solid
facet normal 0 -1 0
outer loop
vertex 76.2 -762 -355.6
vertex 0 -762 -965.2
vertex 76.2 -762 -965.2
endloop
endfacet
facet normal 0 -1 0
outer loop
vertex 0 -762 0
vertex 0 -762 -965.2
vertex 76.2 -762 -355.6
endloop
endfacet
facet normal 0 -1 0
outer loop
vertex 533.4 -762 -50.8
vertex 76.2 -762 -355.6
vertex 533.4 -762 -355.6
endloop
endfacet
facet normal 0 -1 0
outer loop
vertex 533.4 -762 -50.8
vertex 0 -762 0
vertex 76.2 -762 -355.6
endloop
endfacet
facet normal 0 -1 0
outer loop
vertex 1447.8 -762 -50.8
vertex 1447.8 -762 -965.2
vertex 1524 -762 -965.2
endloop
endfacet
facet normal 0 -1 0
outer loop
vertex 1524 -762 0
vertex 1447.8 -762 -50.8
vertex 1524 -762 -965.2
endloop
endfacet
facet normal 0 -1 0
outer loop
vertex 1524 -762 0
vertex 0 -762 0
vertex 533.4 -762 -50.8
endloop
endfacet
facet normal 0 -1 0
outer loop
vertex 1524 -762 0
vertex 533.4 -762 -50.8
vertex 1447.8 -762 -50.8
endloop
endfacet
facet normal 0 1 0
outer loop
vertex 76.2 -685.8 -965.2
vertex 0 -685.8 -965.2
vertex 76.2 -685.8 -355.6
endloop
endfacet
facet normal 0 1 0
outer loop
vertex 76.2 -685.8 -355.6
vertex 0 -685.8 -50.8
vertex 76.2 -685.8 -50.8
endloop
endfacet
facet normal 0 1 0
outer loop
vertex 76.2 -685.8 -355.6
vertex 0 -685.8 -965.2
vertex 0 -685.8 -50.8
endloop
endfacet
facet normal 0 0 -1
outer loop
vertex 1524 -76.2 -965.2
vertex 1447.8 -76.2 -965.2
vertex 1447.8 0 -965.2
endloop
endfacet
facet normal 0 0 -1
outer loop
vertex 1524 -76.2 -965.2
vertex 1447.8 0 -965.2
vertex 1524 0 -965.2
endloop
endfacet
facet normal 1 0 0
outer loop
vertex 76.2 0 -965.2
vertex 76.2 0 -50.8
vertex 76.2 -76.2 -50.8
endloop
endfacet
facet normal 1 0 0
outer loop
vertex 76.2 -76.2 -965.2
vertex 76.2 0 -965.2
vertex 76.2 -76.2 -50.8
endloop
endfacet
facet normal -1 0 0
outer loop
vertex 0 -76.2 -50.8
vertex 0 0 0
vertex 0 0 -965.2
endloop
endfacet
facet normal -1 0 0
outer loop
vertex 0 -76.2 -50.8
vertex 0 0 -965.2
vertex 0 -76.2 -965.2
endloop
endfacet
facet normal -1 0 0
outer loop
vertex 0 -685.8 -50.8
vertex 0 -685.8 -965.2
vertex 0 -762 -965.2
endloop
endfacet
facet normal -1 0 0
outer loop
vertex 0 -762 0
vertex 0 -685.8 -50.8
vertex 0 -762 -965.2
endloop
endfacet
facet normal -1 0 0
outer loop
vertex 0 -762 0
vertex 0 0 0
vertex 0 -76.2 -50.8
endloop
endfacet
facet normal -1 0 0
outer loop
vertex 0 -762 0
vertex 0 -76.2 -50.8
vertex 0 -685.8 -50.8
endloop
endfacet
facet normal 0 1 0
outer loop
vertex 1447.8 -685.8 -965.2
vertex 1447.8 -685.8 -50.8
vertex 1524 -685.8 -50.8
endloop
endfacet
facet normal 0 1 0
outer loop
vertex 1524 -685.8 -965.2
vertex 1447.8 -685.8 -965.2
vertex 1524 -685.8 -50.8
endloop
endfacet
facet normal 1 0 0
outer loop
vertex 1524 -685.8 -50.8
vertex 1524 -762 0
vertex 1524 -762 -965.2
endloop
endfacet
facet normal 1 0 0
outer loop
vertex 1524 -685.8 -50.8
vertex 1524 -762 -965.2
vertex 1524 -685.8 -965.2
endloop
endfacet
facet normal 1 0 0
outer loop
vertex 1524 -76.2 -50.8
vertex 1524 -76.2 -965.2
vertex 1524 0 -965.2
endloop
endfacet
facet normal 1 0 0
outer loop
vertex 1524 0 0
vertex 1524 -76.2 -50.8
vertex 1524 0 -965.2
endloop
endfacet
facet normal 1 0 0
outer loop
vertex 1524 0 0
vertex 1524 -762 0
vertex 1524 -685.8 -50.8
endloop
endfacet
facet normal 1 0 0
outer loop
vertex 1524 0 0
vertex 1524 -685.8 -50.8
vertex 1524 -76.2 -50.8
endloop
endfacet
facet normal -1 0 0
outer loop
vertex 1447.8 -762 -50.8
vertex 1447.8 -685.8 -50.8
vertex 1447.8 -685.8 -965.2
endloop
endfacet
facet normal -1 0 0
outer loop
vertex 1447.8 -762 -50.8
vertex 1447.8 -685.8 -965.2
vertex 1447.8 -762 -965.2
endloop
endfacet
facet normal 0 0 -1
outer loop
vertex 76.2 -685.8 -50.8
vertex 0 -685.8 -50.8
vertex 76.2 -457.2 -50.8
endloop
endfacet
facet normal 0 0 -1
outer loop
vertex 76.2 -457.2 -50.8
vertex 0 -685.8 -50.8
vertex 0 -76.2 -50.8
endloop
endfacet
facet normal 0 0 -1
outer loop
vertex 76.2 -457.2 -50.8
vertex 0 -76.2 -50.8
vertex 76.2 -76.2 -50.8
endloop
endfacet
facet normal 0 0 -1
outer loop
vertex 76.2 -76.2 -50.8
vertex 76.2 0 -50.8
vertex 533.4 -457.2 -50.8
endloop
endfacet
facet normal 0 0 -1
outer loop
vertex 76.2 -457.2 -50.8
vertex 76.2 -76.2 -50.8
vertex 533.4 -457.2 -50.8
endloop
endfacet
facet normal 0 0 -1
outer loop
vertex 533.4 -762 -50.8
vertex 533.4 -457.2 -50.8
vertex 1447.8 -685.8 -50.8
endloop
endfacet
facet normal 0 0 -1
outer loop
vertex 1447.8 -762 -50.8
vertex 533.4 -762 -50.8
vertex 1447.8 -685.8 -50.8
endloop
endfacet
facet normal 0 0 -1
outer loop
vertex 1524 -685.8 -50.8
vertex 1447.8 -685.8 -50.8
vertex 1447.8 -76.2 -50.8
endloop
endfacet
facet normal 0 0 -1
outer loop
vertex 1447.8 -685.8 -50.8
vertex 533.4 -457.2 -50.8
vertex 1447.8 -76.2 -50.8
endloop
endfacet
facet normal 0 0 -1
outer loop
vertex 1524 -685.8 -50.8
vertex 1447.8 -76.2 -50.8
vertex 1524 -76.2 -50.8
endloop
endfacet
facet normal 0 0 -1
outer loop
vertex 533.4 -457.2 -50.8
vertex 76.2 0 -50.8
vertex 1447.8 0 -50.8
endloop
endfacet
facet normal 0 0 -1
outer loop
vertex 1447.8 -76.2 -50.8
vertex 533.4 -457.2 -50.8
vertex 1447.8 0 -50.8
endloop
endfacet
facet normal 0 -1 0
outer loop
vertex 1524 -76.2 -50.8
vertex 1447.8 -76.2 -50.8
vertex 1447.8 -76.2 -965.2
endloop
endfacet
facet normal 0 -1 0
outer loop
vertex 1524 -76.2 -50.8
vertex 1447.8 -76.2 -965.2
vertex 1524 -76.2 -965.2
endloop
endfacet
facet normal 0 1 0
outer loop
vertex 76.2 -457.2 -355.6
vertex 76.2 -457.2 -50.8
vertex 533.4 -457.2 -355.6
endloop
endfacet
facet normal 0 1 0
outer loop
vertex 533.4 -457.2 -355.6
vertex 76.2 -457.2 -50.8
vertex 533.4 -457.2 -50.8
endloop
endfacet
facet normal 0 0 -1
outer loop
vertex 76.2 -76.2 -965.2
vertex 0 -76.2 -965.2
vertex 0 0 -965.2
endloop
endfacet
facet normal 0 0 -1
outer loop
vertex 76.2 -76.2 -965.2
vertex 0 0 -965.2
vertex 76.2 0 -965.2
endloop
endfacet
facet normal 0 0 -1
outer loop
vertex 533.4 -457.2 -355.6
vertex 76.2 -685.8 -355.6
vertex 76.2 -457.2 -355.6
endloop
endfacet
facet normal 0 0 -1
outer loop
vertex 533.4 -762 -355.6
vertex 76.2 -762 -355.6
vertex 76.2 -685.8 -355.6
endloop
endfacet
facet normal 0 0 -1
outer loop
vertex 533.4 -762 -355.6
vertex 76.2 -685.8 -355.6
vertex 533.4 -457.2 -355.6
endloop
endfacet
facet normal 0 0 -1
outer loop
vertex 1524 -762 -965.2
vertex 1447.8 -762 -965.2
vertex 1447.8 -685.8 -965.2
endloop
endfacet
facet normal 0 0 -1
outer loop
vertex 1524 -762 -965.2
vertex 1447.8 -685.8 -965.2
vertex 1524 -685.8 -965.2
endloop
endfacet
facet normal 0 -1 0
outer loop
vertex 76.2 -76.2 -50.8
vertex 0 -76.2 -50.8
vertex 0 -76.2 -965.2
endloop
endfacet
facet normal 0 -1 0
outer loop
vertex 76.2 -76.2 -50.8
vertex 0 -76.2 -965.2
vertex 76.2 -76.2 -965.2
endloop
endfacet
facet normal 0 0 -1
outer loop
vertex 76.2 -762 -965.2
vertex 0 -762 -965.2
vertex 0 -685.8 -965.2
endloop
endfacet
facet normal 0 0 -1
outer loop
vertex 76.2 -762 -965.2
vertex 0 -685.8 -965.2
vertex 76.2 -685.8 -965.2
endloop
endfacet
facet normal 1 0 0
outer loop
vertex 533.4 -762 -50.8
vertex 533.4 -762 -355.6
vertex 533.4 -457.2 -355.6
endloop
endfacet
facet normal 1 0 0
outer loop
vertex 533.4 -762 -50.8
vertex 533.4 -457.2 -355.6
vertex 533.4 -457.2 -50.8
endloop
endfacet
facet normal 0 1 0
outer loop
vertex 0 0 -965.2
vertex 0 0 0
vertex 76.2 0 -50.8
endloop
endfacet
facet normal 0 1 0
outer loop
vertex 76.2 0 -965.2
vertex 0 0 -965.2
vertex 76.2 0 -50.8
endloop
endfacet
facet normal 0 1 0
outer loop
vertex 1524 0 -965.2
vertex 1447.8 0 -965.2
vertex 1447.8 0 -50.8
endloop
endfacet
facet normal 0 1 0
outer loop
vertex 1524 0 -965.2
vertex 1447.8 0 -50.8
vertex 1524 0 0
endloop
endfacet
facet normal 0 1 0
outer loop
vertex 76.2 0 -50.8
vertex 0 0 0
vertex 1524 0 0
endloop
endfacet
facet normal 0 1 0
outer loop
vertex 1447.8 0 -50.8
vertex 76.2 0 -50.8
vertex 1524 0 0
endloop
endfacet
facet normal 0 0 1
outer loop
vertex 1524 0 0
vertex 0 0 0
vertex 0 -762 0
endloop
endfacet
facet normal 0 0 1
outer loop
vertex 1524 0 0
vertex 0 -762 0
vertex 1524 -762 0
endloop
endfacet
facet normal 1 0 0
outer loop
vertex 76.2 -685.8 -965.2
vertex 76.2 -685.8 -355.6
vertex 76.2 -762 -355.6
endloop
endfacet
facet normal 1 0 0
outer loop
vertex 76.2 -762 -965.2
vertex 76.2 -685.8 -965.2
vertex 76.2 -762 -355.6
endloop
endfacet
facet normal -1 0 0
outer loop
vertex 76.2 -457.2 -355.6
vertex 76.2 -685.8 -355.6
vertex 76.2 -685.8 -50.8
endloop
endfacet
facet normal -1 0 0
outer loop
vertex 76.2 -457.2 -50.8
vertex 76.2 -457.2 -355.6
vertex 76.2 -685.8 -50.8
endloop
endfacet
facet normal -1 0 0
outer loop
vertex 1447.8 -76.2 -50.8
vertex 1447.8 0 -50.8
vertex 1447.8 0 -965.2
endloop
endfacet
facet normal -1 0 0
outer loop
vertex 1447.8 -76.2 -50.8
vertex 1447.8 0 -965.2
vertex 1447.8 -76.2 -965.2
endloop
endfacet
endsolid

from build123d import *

# Parameters (mm, degrees)
F0_W     = 1524
F0_H     = 762
F1_DEPTH = 50.8
F2_W     = 76.2
F2_H     = 76.2
F3_DEPTH = 914.4
F4_W     = 457.2
F4_H     = 304.8
F5_DEPTH = 304.8


with BuildPart() as f1:
    # F0 (on Top) → F1 (new body)
    with BuildSketch(Plane.XY):
        with Locations((762, -381)):
            Rectangle(F0_W, F0_H)
    extrude(amount=-F1_DEPTH)

    # F2 (on face) → F3 (join)
    with BuildSketch(Plane(origin=(0, 0, -50.8), x_dir=(1, 0, 0), z_dir=(0, 0, -1))):
        with Locations((38.1, 723.9)):
            Rectangle(F2_W, F2_H)
        with Locations((38.1, 38.1)):
            Rectangle(F2_W, F2_H)
        with Locations((1485.9, 38.1)):
            Rectangle(F2_W, F2_H)
        with Locations((1485.9, 723.9)):
            Rectangle(F2_W, F2_H)
    extrude(amount=F3_DEPTH)

    # F4 (on face) → F5 (join)
    with BuildSketch(Plane.XZ.offset(762)):
        with Locations((304.8, -203.2)):
            Rectangle(F4_W, F4_H)
    extrude(amount=-F5_DEPTH)


solid = f1.part
